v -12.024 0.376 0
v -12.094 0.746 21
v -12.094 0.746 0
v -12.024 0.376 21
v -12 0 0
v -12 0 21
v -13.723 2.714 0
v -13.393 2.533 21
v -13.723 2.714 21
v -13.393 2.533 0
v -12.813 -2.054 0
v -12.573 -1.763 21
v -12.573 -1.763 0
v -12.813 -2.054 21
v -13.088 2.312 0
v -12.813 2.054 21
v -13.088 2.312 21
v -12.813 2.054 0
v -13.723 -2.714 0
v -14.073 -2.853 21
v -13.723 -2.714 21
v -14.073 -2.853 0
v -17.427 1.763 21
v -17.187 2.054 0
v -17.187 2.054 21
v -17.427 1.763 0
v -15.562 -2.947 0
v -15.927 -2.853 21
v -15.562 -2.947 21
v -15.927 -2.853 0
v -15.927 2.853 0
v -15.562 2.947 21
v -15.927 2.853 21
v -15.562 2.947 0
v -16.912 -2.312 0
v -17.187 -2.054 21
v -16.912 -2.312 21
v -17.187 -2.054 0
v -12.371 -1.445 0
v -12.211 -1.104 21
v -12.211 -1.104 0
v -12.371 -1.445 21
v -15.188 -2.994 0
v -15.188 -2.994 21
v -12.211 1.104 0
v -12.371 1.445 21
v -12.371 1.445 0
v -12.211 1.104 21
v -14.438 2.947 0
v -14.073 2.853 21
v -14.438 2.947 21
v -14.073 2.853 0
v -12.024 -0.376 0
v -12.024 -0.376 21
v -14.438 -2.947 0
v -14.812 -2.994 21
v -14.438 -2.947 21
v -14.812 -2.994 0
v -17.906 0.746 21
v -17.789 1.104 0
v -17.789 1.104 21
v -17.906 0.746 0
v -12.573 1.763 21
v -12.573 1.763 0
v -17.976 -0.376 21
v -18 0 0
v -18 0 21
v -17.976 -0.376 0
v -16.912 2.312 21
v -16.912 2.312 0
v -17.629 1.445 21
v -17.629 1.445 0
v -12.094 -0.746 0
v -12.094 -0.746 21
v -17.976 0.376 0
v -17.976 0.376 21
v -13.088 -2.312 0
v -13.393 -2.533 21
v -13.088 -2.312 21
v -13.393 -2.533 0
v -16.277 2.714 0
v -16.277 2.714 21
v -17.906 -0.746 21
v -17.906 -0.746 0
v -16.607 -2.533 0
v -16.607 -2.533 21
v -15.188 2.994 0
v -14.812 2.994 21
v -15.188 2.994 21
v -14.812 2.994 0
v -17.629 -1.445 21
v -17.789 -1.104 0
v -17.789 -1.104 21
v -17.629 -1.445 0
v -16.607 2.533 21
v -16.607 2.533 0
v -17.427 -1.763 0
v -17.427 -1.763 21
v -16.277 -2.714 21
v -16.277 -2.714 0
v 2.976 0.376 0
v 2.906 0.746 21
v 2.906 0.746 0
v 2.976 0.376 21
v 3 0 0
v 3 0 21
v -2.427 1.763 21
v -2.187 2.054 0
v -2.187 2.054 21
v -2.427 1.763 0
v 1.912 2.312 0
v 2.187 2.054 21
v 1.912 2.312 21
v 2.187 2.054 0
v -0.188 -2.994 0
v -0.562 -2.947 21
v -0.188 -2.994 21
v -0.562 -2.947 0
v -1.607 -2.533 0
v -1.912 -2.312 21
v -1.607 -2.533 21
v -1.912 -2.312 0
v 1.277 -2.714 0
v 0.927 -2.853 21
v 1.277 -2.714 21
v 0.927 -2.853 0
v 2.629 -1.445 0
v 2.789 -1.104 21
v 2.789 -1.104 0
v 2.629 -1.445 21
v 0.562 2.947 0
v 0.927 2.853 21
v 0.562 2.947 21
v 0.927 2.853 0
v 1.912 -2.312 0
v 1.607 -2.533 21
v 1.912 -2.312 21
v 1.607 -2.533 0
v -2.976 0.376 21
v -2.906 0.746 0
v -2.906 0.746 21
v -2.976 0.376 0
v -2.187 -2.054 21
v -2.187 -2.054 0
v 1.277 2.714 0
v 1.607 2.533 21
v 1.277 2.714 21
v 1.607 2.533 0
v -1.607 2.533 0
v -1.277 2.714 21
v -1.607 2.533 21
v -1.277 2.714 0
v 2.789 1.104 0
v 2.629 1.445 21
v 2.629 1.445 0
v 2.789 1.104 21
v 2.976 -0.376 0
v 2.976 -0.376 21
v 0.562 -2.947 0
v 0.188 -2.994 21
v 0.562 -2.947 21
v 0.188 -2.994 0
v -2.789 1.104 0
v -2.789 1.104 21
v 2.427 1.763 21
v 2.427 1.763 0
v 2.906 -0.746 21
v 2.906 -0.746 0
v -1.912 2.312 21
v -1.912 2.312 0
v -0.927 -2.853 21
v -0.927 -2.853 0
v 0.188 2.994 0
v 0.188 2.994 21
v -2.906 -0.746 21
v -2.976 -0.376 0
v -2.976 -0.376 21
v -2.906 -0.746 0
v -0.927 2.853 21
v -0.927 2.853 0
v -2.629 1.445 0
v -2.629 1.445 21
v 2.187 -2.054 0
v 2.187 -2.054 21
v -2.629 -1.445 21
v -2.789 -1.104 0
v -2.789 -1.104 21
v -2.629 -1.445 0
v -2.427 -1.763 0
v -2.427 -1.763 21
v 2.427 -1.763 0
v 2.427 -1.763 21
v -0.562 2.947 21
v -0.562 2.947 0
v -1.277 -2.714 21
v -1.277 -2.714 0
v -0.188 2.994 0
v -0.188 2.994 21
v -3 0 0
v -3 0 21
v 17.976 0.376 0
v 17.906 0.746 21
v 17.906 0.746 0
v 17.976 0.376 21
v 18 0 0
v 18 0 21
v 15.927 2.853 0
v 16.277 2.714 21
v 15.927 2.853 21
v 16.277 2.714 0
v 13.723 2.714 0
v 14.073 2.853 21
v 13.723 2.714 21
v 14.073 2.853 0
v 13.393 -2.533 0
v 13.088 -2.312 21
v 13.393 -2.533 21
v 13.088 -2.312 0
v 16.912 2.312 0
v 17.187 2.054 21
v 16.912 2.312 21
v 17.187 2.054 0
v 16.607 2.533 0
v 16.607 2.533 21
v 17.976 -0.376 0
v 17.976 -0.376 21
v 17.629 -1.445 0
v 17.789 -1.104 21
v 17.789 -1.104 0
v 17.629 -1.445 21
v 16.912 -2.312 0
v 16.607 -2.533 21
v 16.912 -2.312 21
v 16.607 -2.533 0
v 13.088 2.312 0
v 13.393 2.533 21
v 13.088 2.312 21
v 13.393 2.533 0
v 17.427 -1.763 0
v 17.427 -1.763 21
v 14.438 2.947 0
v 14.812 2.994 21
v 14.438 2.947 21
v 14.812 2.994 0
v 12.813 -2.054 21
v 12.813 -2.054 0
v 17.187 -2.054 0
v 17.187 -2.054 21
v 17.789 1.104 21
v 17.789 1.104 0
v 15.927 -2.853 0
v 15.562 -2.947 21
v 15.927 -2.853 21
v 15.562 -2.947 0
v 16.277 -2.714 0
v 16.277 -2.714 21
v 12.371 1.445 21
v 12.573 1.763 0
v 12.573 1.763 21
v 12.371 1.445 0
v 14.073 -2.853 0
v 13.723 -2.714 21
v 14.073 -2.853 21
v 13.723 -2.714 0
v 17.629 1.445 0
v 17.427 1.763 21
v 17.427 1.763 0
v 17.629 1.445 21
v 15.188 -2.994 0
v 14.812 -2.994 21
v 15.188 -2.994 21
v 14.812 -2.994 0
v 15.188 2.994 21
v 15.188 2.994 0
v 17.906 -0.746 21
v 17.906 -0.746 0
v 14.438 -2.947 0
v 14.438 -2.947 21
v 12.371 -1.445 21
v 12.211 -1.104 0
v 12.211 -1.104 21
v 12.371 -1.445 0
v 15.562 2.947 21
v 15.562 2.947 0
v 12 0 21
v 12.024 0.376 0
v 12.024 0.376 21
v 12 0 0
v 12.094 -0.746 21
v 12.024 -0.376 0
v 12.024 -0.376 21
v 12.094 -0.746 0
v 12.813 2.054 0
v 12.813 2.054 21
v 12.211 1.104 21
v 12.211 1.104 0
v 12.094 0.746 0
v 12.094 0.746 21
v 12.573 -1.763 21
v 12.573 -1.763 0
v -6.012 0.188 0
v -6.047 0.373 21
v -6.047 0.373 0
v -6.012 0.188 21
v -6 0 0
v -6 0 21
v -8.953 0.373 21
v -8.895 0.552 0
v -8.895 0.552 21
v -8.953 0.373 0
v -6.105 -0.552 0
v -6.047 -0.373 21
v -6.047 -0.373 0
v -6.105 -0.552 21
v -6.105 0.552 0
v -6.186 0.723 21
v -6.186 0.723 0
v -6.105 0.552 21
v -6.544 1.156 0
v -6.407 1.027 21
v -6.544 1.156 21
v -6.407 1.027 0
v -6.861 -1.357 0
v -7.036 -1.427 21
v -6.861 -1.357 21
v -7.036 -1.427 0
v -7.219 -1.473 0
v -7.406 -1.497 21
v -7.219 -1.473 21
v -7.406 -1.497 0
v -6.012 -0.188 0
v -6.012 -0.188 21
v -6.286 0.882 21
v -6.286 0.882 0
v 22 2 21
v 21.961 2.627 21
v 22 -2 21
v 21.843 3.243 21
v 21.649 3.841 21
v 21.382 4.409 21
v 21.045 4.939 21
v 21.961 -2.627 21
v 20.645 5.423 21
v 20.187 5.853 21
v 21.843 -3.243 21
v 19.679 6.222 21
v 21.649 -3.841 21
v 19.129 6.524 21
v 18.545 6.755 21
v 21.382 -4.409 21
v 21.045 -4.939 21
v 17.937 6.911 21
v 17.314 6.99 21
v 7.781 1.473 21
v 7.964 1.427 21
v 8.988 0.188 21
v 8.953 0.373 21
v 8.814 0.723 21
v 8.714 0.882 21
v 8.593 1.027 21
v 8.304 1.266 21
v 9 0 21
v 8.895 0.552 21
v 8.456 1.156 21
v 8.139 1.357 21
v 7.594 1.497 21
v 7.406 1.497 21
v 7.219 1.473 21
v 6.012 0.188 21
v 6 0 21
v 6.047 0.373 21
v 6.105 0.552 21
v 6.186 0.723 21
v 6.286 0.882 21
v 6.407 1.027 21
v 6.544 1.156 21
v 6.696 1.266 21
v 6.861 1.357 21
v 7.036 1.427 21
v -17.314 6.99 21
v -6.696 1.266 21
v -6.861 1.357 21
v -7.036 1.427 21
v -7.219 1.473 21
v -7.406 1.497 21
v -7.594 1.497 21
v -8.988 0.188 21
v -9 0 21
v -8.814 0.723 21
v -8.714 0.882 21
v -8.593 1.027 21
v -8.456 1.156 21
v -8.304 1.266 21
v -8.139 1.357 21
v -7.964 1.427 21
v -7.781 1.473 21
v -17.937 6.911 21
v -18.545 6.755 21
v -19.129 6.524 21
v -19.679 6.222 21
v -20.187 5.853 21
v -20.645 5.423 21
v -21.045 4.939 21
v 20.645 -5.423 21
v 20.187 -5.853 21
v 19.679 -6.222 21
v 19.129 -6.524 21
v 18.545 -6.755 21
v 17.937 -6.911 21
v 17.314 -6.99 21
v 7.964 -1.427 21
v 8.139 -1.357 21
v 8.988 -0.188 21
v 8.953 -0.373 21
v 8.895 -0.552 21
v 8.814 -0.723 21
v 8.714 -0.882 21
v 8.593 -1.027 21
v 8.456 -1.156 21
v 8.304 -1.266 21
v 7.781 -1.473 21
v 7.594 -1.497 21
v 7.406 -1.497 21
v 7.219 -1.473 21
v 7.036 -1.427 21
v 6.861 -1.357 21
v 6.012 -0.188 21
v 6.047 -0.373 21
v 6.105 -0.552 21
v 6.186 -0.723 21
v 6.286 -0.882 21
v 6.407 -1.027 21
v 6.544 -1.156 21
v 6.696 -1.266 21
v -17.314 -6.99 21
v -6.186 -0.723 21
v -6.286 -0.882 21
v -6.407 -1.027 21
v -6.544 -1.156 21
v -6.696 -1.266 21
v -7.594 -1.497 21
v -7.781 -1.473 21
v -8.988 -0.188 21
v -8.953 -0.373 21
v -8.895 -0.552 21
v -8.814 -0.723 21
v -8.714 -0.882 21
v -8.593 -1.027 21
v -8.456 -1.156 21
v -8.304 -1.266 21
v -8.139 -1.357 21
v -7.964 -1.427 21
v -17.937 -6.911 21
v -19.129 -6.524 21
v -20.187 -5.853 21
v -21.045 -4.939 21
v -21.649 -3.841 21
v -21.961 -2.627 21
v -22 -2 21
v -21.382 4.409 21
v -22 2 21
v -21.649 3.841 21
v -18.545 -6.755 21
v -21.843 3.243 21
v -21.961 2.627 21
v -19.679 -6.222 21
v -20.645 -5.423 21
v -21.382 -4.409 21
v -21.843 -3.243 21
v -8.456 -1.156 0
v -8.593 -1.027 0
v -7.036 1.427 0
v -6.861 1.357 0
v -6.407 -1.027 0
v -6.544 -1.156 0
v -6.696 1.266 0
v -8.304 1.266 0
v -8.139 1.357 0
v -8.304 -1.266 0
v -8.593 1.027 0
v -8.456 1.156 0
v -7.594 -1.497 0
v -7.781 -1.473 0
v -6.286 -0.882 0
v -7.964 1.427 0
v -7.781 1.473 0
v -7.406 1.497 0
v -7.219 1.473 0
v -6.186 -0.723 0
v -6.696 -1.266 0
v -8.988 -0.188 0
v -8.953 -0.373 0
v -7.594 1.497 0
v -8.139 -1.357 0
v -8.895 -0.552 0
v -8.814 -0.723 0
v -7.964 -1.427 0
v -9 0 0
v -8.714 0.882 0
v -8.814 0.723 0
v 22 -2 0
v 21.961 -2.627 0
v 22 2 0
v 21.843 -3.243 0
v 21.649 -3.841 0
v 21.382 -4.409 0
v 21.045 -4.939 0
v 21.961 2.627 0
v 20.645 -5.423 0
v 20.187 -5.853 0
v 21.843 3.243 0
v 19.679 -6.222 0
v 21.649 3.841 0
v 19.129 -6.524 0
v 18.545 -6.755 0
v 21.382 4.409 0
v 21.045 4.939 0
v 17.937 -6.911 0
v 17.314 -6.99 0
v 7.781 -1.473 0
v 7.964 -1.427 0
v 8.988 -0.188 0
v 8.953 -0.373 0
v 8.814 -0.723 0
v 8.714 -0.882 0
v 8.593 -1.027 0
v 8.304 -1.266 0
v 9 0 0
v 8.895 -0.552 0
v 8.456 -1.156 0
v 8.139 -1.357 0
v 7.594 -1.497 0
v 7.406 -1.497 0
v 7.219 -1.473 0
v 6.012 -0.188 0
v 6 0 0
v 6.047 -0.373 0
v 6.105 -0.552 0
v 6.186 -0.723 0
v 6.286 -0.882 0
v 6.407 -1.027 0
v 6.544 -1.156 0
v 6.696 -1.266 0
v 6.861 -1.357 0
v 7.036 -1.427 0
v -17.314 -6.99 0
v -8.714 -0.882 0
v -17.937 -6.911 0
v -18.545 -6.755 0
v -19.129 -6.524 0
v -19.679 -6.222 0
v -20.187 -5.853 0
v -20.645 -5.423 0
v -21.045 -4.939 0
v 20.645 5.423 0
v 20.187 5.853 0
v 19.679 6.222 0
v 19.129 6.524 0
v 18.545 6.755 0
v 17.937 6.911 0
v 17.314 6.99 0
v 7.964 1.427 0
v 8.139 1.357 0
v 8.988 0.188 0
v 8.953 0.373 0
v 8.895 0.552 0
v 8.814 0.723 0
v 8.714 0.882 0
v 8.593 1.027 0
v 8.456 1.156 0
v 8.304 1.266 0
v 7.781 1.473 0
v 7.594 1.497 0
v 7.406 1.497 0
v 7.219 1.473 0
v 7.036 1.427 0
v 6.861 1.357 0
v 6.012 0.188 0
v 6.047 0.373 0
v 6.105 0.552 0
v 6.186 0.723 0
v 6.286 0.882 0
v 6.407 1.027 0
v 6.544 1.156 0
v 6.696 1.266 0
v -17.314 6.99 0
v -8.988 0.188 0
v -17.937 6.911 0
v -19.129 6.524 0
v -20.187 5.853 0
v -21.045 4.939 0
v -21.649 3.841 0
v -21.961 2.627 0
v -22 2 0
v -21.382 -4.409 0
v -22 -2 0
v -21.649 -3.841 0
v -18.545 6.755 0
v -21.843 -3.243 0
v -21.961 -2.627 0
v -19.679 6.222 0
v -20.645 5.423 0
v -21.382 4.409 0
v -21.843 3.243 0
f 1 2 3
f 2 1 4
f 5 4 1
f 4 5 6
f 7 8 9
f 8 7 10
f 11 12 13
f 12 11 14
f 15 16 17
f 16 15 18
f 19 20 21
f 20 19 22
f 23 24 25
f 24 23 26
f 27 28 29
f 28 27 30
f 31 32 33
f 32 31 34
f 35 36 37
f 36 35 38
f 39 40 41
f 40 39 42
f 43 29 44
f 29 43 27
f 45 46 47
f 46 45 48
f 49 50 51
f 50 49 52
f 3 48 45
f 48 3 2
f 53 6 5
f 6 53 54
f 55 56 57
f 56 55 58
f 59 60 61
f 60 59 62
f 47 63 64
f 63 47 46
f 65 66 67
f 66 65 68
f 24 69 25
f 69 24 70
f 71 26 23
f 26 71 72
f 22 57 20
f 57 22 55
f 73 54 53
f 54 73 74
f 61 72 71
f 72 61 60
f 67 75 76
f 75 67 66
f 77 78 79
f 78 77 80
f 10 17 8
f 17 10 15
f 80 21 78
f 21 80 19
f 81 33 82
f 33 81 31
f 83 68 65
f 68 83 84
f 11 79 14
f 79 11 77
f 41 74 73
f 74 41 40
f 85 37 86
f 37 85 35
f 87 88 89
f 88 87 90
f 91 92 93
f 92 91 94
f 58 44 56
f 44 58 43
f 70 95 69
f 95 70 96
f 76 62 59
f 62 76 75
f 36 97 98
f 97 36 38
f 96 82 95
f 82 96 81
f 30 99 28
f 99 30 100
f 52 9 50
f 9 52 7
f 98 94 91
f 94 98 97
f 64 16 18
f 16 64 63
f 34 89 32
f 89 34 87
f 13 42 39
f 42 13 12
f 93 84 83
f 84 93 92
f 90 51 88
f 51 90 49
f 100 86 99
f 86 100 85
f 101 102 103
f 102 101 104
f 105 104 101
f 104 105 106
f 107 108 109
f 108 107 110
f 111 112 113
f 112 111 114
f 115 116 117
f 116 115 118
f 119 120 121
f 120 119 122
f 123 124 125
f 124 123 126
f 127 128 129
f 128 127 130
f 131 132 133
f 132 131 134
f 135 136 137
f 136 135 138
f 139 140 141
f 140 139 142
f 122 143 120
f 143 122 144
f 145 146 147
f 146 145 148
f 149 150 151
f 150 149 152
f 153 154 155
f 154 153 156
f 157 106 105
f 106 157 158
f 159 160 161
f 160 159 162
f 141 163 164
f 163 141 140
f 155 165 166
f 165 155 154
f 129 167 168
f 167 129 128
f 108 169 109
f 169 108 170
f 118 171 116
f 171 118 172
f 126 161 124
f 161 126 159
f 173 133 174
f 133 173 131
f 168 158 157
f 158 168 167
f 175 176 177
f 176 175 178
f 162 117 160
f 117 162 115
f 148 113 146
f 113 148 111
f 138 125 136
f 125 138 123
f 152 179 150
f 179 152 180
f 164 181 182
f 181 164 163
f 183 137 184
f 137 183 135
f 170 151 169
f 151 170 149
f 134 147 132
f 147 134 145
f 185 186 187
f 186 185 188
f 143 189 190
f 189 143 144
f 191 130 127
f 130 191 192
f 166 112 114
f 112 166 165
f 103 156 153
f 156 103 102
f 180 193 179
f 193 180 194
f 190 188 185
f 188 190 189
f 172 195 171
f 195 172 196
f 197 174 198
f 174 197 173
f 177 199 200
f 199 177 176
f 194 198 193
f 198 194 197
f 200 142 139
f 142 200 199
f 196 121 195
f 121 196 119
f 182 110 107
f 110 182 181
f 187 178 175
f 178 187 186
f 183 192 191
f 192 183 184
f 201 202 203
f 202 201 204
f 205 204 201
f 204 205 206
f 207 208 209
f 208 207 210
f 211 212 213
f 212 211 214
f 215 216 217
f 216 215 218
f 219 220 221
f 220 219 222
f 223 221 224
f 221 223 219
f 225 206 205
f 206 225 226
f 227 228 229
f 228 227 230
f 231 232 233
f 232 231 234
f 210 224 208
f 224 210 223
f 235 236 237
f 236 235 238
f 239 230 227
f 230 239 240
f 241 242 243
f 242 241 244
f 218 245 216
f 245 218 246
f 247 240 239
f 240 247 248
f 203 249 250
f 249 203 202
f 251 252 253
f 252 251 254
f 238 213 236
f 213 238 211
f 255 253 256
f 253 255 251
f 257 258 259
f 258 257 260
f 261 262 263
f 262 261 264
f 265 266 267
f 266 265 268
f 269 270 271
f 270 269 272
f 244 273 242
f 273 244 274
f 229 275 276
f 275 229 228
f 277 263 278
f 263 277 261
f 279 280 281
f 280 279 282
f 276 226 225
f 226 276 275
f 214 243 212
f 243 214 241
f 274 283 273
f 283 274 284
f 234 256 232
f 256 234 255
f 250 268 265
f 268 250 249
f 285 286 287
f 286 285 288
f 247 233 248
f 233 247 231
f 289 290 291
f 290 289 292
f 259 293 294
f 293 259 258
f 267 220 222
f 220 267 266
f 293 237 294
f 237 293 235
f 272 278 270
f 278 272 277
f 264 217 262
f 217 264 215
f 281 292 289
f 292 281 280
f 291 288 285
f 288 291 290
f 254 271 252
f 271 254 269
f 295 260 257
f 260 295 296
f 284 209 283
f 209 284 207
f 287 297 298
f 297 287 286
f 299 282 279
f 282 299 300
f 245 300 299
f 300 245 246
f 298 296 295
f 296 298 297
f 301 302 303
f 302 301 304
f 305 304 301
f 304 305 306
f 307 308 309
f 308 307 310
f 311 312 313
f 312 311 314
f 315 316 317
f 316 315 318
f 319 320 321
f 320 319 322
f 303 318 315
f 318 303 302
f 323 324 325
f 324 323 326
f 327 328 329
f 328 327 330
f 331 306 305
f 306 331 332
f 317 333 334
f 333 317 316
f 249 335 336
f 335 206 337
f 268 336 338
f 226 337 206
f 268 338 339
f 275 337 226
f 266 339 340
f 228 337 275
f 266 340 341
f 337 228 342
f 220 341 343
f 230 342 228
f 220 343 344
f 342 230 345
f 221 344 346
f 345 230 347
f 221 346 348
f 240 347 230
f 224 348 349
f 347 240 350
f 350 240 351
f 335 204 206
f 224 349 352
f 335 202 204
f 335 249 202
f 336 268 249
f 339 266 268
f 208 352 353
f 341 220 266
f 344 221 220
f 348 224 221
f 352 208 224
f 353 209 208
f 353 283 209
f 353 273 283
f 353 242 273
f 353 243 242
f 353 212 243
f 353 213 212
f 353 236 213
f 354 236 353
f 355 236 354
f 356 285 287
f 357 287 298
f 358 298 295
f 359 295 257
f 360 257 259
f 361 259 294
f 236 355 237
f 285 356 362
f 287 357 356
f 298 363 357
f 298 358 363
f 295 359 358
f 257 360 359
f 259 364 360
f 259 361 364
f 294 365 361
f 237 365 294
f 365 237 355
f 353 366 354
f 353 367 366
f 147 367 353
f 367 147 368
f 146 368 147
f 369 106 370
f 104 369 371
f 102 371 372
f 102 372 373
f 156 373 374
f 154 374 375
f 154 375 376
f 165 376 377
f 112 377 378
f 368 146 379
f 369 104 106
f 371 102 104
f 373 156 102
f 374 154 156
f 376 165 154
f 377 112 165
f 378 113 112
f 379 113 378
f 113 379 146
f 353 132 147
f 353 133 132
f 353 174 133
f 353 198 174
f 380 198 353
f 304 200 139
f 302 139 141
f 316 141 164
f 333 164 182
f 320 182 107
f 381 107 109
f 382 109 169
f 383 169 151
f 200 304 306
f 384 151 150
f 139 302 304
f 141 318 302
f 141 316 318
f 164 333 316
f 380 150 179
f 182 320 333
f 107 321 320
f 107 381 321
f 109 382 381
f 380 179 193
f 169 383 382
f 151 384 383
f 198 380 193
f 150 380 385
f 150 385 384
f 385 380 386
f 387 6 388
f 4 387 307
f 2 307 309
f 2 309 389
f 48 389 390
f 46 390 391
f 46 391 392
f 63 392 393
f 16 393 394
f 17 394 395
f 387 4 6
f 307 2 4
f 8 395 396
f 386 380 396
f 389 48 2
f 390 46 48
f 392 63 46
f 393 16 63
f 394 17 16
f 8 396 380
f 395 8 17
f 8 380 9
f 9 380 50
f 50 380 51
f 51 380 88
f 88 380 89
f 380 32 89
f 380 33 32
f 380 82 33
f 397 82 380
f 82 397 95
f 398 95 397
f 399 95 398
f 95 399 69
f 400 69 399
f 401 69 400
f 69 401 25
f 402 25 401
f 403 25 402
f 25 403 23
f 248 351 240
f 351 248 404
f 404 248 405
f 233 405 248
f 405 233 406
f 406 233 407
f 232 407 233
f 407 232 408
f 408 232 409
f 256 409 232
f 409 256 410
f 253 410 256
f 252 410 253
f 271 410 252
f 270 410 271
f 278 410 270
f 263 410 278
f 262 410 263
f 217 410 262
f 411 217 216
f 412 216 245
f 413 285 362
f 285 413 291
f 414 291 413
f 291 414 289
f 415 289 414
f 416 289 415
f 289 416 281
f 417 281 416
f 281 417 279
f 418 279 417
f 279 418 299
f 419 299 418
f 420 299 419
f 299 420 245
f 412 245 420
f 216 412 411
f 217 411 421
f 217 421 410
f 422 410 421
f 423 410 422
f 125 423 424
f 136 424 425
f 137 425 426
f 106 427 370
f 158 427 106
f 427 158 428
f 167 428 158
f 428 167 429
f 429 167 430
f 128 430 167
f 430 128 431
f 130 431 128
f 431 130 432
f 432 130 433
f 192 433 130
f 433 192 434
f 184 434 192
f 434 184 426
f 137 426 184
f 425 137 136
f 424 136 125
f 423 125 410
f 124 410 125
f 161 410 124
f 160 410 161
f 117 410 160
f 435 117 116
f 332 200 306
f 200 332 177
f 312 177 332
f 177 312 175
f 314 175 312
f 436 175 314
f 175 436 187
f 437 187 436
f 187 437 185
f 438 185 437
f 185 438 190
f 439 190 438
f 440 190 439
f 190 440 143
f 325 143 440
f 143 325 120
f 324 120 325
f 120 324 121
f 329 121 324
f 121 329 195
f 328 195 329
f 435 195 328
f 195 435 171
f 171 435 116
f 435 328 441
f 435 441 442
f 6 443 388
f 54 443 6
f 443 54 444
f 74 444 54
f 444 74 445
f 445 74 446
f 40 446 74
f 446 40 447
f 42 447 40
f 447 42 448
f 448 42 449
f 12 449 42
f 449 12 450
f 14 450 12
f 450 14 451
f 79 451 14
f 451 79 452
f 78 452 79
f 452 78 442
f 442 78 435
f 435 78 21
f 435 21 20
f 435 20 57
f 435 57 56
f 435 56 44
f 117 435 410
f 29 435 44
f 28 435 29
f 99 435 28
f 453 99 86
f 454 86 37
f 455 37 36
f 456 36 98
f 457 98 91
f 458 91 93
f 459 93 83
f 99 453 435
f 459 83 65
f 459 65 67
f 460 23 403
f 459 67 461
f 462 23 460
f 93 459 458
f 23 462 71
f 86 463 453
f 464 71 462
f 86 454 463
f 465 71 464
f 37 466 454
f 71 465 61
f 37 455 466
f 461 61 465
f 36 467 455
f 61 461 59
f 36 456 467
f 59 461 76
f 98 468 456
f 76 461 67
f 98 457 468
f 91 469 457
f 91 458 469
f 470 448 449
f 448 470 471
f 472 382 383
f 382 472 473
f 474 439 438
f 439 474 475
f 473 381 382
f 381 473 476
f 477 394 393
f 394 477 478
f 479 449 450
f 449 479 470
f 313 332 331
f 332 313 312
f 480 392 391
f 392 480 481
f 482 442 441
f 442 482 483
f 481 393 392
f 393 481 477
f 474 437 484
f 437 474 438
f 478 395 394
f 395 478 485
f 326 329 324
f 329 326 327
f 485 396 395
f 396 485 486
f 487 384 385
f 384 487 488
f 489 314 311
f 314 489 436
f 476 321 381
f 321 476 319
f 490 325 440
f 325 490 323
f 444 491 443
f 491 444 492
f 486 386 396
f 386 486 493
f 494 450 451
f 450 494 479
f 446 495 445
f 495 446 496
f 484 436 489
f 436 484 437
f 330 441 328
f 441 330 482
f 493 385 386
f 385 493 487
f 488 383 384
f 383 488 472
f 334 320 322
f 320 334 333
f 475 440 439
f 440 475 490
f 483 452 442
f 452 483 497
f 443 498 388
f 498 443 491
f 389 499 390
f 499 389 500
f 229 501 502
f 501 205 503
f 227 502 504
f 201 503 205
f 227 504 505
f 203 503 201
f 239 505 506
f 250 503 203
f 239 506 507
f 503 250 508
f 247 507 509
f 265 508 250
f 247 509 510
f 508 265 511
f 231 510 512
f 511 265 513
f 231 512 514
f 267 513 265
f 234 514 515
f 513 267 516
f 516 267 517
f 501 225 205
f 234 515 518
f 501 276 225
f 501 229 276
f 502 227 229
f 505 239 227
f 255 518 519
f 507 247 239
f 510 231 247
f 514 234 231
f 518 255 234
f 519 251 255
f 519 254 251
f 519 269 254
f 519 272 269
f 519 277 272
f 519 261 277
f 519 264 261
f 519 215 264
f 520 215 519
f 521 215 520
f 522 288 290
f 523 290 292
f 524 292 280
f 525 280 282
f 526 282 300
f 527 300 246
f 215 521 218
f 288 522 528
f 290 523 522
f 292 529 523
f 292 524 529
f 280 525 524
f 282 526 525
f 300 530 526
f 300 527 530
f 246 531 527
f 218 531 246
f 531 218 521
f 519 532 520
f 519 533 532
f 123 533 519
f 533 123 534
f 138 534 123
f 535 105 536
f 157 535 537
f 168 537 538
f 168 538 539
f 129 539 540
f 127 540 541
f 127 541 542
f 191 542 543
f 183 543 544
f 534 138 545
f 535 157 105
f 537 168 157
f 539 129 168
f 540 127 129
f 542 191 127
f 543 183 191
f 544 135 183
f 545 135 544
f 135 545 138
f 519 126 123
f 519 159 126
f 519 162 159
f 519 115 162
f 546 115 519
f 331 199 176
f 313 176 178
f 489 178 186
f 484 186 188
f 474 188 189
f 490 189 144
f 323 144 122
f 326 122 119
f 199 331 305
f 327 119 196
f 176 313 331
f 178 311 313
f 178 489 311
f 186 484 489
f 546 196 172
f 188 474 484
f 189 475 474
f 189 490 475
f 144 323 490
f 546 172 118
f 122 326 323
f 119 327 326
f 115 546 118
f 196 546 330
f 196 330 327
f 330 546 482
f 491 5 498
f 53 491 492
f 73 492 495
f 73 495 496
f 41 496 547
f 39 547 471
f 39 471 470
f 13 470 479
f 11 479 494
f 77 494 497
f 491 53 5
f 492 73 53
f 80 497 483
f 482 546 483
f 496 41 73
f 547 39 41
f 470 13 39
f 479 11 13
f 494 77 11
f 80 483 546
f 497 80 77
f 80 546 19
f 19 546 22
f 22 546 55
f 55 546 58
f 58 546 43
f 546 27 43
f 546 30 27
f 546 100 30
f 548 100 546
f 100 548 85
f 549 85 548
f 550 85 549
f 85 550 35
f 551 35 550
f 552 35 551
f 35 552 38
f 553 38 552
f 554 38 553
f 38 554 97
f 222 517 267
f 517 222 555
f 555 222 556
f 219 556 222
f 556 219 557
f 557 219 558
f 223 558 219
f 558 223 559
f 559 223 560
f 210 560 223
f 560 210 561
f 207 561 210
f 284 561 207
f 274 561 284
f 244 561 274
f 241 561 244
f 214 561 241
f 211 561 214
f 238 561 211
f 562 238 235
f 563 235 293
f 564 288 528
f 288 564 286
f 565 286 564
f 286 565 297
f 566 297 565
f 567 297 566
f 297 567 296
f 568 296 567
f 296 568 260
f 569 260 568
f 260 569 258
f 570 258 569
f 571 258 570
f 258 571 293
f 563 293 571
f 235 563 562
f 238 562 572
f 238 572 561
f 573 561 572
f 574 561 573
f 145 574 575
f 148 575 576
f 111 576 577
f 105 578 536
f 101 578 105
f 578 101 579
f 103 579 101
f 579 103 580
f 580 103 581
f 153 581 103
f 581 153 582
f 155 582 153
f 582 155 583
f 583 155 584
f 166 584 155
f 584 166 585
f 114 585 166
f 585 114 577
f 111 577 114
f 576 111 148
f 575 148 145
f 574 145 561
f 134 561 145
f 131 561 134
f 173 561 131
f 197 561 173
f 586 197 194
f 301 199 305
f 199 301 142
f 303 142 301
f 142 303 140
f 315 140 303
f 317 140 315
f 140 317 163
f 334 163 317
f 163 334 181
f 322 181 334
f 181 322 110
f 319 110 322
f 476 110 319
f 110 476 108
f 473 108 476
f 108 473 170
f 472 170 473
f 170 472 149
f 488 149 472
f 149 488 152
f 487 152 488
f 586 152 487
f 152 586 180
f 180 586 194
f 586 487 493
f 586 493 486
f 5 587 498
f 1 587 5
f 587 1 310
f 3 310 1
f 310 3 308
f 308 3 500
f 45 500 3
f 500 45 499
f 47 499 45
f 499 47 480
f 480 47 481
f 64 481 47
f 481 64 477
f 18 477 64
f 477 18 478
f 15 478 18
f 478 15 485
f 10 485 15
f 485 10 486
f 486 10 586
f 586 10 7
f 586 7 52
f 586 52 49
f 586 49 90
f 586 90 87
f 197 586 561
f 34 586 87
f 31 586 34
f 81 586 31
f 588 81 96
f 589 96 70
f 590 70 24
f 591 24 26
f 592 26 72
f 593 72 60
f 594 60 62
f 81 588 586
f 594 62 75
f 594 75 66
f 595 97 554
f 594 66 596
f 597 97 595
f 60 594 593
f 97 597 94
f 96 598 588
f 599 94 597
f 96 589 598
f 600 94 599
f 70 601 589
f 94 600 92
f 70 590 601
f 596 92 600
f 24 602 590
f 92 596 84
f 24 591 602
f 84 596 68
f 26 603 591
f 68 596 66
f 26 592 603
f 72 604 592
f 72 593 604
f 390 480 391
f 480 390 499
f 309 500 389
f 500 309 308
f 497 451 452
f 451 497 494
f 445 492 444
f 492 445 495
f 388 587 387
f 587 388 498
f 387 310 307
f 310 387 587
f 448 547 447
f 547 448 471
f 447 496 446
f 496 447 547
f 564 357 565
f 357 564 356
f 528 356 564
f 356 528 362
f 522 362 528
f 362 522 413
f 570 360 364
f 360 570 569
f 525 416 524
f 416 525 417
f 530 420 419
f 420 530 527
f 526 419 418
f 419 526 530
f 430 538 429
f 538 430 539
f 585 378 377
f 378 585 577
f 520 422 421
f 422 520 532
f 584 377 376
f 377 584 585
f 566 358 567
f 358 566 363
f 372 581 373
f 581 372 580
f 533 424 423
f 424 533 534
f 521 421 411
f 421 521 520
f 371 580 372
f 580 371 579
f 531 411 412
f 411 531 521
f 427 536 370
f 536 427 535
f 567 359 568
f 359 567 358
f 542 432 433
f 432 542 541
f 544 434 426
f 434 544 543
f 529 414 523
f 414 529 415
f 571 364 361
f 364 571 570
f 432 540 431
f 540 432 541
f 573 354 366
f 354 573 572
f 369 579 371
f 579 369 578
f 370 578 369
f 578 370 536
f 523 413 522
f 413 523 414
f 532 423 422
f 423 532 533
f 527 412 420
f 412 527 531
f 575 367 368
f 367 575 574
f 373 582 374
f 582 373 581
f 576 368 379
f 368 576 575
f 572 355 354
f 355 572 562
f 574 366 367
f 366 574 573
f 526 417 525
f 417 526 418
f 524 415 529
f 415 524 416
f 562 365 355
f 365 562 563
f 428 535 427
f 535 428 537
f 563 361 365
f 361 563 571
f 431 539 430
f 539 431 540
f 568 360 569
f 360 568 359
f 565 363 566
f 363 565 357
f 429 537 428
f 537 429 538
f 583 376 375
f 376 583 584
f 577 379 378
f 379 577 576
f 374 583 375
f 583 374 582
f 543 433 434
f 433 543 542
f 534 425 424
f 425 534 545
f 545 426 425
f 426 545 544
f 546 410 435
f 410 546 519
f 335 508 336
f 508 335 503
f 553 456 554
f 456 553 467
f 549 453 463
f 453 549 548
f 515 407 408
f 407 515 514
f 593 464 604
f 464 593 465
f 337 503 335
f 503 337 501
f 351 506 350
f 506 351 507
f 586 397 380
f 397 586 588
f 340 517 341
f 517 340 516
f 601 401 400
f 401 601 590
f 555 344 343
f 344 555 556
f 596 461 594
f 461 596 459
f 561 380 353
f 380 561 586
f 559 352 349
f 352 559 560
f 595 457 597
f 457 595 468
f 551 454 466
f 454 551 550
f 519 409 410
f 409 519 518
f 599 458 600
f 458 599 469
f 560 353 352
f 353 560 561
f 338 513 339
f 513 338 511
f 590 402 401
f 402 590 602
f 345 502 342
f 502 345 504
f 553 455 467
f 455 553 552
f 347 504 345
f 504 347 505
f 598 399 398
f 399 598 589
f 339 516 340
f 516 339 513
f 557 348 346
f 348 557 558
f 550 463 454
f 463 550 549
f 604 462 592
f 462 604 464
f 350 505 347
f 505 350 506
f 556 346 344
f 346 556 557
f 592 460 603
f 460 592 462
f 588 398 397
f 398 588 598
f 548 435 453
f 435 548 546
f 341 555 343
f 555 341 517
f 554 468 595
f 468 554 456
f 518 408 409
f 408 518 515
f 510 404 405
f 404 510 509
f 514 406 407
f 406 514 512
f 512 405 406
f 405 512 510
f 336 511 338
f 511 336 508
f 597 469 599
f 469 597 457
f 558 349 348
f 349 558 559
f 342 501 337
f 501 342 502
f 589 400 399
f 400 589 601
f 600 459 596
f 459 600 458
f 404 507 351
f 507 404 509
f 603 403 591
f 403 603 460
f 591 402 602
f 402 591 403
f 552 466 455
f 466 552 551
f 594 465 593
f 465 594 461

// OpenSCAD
$fn = 50;


difference() {
	union() {
		hull() {
			translate(v = [-17.0000000000, 2.0000000000, 0]) {
				cylinder(h = 21, r = 5);
			}
			translate(v = [17.0000000000, 2.0000000000, 0]) {
				cylinder(h = 21, r = 5);
			}
			translate(v = [-17.0000000000, -2.0000000000, 0]) {
				cylinder(h = 21, r = 5);
			}
			translate(v = [17.0000000000, -2.0000000000, 0]) {
				cylinder(h = 21, r = 5);
			}
		}
	}
	union() {
		translate(v = [-15.0000000000, 0.0000000000, -100.0000000000]) {
			cylinder(h = 200, r = 3.0000000000);
		}
		translate(v = [0.0000000000, 0.0000000000, -100.0000000000]) {
			cylinder(h = 200, r = 3.0000000000);
		}
		translate(v = [15.0000000000, 0.0000000000, -100.0000000000]) {
			cylinder(h = 200, r = 3.0000000000);
		}
		translate(v = [-15.0000000000, 0.0000000000, 0]) {
			cylinder(h = 21, r = 1.5000000000);
		}
		translate(v = [-7.5000000000, 0.0000000000, 0]) {
			cylinder(h = 21, r = 1.5000000000);
		}
		cylinder(h = 21, r = 1.5000000000);
		translate(v = [7.5000000000, 0.0000000000, 0]) {
			cylinder(h = 21, r = 1.5000000000);
		}
		translate(v = [15.0000000000, 0.0000000000, 0]) {
			cylinder(h = 21, r = 1.5000000000);
		}
		translate(v = [-15.0000000000, 0.0000000000, 0]) {
			cylinder(h = 21, r = 1.5000000000);
		}
		translate(v = [-7.5000000000, 0.0000000000, 0]) {
			cylinder(h = 21, r = 1.5000000000);
		}
		cylinder(h = 21, r = 1.5000000000);
		translate(v = [7.5000000000, 0.0000000000, 0]) {
			cylinder(h = 21, r = 1.5000000000);
		}
		translate(v = [15.0000000000, 0.0000000000, 0]) {
			cylinder(h = 21, r = 1.5000000000);
		}
		translate(v = [-15.0000000000, 0.0000000000, 0]) {
			cylinder(h = 21, r = 1.5000000000);
		}
		translate(v = [-7.5000000000, 0.0000000000, 0]) {
			cylinder(h = 21, r = 1.5000000000);
		}
		cylinder(h = 21, r = 1.5000000000);
		translate(v = [7.5000000000, 0.0000000000, 0]) {
			cylinder(h = 21, r = 1.5000000000);
		}
		translate(v = [15.0000000000, 0.0000000000, 0]) {
			cylinder(h = 21, r = 1.5000000000);
		}
	}
}
